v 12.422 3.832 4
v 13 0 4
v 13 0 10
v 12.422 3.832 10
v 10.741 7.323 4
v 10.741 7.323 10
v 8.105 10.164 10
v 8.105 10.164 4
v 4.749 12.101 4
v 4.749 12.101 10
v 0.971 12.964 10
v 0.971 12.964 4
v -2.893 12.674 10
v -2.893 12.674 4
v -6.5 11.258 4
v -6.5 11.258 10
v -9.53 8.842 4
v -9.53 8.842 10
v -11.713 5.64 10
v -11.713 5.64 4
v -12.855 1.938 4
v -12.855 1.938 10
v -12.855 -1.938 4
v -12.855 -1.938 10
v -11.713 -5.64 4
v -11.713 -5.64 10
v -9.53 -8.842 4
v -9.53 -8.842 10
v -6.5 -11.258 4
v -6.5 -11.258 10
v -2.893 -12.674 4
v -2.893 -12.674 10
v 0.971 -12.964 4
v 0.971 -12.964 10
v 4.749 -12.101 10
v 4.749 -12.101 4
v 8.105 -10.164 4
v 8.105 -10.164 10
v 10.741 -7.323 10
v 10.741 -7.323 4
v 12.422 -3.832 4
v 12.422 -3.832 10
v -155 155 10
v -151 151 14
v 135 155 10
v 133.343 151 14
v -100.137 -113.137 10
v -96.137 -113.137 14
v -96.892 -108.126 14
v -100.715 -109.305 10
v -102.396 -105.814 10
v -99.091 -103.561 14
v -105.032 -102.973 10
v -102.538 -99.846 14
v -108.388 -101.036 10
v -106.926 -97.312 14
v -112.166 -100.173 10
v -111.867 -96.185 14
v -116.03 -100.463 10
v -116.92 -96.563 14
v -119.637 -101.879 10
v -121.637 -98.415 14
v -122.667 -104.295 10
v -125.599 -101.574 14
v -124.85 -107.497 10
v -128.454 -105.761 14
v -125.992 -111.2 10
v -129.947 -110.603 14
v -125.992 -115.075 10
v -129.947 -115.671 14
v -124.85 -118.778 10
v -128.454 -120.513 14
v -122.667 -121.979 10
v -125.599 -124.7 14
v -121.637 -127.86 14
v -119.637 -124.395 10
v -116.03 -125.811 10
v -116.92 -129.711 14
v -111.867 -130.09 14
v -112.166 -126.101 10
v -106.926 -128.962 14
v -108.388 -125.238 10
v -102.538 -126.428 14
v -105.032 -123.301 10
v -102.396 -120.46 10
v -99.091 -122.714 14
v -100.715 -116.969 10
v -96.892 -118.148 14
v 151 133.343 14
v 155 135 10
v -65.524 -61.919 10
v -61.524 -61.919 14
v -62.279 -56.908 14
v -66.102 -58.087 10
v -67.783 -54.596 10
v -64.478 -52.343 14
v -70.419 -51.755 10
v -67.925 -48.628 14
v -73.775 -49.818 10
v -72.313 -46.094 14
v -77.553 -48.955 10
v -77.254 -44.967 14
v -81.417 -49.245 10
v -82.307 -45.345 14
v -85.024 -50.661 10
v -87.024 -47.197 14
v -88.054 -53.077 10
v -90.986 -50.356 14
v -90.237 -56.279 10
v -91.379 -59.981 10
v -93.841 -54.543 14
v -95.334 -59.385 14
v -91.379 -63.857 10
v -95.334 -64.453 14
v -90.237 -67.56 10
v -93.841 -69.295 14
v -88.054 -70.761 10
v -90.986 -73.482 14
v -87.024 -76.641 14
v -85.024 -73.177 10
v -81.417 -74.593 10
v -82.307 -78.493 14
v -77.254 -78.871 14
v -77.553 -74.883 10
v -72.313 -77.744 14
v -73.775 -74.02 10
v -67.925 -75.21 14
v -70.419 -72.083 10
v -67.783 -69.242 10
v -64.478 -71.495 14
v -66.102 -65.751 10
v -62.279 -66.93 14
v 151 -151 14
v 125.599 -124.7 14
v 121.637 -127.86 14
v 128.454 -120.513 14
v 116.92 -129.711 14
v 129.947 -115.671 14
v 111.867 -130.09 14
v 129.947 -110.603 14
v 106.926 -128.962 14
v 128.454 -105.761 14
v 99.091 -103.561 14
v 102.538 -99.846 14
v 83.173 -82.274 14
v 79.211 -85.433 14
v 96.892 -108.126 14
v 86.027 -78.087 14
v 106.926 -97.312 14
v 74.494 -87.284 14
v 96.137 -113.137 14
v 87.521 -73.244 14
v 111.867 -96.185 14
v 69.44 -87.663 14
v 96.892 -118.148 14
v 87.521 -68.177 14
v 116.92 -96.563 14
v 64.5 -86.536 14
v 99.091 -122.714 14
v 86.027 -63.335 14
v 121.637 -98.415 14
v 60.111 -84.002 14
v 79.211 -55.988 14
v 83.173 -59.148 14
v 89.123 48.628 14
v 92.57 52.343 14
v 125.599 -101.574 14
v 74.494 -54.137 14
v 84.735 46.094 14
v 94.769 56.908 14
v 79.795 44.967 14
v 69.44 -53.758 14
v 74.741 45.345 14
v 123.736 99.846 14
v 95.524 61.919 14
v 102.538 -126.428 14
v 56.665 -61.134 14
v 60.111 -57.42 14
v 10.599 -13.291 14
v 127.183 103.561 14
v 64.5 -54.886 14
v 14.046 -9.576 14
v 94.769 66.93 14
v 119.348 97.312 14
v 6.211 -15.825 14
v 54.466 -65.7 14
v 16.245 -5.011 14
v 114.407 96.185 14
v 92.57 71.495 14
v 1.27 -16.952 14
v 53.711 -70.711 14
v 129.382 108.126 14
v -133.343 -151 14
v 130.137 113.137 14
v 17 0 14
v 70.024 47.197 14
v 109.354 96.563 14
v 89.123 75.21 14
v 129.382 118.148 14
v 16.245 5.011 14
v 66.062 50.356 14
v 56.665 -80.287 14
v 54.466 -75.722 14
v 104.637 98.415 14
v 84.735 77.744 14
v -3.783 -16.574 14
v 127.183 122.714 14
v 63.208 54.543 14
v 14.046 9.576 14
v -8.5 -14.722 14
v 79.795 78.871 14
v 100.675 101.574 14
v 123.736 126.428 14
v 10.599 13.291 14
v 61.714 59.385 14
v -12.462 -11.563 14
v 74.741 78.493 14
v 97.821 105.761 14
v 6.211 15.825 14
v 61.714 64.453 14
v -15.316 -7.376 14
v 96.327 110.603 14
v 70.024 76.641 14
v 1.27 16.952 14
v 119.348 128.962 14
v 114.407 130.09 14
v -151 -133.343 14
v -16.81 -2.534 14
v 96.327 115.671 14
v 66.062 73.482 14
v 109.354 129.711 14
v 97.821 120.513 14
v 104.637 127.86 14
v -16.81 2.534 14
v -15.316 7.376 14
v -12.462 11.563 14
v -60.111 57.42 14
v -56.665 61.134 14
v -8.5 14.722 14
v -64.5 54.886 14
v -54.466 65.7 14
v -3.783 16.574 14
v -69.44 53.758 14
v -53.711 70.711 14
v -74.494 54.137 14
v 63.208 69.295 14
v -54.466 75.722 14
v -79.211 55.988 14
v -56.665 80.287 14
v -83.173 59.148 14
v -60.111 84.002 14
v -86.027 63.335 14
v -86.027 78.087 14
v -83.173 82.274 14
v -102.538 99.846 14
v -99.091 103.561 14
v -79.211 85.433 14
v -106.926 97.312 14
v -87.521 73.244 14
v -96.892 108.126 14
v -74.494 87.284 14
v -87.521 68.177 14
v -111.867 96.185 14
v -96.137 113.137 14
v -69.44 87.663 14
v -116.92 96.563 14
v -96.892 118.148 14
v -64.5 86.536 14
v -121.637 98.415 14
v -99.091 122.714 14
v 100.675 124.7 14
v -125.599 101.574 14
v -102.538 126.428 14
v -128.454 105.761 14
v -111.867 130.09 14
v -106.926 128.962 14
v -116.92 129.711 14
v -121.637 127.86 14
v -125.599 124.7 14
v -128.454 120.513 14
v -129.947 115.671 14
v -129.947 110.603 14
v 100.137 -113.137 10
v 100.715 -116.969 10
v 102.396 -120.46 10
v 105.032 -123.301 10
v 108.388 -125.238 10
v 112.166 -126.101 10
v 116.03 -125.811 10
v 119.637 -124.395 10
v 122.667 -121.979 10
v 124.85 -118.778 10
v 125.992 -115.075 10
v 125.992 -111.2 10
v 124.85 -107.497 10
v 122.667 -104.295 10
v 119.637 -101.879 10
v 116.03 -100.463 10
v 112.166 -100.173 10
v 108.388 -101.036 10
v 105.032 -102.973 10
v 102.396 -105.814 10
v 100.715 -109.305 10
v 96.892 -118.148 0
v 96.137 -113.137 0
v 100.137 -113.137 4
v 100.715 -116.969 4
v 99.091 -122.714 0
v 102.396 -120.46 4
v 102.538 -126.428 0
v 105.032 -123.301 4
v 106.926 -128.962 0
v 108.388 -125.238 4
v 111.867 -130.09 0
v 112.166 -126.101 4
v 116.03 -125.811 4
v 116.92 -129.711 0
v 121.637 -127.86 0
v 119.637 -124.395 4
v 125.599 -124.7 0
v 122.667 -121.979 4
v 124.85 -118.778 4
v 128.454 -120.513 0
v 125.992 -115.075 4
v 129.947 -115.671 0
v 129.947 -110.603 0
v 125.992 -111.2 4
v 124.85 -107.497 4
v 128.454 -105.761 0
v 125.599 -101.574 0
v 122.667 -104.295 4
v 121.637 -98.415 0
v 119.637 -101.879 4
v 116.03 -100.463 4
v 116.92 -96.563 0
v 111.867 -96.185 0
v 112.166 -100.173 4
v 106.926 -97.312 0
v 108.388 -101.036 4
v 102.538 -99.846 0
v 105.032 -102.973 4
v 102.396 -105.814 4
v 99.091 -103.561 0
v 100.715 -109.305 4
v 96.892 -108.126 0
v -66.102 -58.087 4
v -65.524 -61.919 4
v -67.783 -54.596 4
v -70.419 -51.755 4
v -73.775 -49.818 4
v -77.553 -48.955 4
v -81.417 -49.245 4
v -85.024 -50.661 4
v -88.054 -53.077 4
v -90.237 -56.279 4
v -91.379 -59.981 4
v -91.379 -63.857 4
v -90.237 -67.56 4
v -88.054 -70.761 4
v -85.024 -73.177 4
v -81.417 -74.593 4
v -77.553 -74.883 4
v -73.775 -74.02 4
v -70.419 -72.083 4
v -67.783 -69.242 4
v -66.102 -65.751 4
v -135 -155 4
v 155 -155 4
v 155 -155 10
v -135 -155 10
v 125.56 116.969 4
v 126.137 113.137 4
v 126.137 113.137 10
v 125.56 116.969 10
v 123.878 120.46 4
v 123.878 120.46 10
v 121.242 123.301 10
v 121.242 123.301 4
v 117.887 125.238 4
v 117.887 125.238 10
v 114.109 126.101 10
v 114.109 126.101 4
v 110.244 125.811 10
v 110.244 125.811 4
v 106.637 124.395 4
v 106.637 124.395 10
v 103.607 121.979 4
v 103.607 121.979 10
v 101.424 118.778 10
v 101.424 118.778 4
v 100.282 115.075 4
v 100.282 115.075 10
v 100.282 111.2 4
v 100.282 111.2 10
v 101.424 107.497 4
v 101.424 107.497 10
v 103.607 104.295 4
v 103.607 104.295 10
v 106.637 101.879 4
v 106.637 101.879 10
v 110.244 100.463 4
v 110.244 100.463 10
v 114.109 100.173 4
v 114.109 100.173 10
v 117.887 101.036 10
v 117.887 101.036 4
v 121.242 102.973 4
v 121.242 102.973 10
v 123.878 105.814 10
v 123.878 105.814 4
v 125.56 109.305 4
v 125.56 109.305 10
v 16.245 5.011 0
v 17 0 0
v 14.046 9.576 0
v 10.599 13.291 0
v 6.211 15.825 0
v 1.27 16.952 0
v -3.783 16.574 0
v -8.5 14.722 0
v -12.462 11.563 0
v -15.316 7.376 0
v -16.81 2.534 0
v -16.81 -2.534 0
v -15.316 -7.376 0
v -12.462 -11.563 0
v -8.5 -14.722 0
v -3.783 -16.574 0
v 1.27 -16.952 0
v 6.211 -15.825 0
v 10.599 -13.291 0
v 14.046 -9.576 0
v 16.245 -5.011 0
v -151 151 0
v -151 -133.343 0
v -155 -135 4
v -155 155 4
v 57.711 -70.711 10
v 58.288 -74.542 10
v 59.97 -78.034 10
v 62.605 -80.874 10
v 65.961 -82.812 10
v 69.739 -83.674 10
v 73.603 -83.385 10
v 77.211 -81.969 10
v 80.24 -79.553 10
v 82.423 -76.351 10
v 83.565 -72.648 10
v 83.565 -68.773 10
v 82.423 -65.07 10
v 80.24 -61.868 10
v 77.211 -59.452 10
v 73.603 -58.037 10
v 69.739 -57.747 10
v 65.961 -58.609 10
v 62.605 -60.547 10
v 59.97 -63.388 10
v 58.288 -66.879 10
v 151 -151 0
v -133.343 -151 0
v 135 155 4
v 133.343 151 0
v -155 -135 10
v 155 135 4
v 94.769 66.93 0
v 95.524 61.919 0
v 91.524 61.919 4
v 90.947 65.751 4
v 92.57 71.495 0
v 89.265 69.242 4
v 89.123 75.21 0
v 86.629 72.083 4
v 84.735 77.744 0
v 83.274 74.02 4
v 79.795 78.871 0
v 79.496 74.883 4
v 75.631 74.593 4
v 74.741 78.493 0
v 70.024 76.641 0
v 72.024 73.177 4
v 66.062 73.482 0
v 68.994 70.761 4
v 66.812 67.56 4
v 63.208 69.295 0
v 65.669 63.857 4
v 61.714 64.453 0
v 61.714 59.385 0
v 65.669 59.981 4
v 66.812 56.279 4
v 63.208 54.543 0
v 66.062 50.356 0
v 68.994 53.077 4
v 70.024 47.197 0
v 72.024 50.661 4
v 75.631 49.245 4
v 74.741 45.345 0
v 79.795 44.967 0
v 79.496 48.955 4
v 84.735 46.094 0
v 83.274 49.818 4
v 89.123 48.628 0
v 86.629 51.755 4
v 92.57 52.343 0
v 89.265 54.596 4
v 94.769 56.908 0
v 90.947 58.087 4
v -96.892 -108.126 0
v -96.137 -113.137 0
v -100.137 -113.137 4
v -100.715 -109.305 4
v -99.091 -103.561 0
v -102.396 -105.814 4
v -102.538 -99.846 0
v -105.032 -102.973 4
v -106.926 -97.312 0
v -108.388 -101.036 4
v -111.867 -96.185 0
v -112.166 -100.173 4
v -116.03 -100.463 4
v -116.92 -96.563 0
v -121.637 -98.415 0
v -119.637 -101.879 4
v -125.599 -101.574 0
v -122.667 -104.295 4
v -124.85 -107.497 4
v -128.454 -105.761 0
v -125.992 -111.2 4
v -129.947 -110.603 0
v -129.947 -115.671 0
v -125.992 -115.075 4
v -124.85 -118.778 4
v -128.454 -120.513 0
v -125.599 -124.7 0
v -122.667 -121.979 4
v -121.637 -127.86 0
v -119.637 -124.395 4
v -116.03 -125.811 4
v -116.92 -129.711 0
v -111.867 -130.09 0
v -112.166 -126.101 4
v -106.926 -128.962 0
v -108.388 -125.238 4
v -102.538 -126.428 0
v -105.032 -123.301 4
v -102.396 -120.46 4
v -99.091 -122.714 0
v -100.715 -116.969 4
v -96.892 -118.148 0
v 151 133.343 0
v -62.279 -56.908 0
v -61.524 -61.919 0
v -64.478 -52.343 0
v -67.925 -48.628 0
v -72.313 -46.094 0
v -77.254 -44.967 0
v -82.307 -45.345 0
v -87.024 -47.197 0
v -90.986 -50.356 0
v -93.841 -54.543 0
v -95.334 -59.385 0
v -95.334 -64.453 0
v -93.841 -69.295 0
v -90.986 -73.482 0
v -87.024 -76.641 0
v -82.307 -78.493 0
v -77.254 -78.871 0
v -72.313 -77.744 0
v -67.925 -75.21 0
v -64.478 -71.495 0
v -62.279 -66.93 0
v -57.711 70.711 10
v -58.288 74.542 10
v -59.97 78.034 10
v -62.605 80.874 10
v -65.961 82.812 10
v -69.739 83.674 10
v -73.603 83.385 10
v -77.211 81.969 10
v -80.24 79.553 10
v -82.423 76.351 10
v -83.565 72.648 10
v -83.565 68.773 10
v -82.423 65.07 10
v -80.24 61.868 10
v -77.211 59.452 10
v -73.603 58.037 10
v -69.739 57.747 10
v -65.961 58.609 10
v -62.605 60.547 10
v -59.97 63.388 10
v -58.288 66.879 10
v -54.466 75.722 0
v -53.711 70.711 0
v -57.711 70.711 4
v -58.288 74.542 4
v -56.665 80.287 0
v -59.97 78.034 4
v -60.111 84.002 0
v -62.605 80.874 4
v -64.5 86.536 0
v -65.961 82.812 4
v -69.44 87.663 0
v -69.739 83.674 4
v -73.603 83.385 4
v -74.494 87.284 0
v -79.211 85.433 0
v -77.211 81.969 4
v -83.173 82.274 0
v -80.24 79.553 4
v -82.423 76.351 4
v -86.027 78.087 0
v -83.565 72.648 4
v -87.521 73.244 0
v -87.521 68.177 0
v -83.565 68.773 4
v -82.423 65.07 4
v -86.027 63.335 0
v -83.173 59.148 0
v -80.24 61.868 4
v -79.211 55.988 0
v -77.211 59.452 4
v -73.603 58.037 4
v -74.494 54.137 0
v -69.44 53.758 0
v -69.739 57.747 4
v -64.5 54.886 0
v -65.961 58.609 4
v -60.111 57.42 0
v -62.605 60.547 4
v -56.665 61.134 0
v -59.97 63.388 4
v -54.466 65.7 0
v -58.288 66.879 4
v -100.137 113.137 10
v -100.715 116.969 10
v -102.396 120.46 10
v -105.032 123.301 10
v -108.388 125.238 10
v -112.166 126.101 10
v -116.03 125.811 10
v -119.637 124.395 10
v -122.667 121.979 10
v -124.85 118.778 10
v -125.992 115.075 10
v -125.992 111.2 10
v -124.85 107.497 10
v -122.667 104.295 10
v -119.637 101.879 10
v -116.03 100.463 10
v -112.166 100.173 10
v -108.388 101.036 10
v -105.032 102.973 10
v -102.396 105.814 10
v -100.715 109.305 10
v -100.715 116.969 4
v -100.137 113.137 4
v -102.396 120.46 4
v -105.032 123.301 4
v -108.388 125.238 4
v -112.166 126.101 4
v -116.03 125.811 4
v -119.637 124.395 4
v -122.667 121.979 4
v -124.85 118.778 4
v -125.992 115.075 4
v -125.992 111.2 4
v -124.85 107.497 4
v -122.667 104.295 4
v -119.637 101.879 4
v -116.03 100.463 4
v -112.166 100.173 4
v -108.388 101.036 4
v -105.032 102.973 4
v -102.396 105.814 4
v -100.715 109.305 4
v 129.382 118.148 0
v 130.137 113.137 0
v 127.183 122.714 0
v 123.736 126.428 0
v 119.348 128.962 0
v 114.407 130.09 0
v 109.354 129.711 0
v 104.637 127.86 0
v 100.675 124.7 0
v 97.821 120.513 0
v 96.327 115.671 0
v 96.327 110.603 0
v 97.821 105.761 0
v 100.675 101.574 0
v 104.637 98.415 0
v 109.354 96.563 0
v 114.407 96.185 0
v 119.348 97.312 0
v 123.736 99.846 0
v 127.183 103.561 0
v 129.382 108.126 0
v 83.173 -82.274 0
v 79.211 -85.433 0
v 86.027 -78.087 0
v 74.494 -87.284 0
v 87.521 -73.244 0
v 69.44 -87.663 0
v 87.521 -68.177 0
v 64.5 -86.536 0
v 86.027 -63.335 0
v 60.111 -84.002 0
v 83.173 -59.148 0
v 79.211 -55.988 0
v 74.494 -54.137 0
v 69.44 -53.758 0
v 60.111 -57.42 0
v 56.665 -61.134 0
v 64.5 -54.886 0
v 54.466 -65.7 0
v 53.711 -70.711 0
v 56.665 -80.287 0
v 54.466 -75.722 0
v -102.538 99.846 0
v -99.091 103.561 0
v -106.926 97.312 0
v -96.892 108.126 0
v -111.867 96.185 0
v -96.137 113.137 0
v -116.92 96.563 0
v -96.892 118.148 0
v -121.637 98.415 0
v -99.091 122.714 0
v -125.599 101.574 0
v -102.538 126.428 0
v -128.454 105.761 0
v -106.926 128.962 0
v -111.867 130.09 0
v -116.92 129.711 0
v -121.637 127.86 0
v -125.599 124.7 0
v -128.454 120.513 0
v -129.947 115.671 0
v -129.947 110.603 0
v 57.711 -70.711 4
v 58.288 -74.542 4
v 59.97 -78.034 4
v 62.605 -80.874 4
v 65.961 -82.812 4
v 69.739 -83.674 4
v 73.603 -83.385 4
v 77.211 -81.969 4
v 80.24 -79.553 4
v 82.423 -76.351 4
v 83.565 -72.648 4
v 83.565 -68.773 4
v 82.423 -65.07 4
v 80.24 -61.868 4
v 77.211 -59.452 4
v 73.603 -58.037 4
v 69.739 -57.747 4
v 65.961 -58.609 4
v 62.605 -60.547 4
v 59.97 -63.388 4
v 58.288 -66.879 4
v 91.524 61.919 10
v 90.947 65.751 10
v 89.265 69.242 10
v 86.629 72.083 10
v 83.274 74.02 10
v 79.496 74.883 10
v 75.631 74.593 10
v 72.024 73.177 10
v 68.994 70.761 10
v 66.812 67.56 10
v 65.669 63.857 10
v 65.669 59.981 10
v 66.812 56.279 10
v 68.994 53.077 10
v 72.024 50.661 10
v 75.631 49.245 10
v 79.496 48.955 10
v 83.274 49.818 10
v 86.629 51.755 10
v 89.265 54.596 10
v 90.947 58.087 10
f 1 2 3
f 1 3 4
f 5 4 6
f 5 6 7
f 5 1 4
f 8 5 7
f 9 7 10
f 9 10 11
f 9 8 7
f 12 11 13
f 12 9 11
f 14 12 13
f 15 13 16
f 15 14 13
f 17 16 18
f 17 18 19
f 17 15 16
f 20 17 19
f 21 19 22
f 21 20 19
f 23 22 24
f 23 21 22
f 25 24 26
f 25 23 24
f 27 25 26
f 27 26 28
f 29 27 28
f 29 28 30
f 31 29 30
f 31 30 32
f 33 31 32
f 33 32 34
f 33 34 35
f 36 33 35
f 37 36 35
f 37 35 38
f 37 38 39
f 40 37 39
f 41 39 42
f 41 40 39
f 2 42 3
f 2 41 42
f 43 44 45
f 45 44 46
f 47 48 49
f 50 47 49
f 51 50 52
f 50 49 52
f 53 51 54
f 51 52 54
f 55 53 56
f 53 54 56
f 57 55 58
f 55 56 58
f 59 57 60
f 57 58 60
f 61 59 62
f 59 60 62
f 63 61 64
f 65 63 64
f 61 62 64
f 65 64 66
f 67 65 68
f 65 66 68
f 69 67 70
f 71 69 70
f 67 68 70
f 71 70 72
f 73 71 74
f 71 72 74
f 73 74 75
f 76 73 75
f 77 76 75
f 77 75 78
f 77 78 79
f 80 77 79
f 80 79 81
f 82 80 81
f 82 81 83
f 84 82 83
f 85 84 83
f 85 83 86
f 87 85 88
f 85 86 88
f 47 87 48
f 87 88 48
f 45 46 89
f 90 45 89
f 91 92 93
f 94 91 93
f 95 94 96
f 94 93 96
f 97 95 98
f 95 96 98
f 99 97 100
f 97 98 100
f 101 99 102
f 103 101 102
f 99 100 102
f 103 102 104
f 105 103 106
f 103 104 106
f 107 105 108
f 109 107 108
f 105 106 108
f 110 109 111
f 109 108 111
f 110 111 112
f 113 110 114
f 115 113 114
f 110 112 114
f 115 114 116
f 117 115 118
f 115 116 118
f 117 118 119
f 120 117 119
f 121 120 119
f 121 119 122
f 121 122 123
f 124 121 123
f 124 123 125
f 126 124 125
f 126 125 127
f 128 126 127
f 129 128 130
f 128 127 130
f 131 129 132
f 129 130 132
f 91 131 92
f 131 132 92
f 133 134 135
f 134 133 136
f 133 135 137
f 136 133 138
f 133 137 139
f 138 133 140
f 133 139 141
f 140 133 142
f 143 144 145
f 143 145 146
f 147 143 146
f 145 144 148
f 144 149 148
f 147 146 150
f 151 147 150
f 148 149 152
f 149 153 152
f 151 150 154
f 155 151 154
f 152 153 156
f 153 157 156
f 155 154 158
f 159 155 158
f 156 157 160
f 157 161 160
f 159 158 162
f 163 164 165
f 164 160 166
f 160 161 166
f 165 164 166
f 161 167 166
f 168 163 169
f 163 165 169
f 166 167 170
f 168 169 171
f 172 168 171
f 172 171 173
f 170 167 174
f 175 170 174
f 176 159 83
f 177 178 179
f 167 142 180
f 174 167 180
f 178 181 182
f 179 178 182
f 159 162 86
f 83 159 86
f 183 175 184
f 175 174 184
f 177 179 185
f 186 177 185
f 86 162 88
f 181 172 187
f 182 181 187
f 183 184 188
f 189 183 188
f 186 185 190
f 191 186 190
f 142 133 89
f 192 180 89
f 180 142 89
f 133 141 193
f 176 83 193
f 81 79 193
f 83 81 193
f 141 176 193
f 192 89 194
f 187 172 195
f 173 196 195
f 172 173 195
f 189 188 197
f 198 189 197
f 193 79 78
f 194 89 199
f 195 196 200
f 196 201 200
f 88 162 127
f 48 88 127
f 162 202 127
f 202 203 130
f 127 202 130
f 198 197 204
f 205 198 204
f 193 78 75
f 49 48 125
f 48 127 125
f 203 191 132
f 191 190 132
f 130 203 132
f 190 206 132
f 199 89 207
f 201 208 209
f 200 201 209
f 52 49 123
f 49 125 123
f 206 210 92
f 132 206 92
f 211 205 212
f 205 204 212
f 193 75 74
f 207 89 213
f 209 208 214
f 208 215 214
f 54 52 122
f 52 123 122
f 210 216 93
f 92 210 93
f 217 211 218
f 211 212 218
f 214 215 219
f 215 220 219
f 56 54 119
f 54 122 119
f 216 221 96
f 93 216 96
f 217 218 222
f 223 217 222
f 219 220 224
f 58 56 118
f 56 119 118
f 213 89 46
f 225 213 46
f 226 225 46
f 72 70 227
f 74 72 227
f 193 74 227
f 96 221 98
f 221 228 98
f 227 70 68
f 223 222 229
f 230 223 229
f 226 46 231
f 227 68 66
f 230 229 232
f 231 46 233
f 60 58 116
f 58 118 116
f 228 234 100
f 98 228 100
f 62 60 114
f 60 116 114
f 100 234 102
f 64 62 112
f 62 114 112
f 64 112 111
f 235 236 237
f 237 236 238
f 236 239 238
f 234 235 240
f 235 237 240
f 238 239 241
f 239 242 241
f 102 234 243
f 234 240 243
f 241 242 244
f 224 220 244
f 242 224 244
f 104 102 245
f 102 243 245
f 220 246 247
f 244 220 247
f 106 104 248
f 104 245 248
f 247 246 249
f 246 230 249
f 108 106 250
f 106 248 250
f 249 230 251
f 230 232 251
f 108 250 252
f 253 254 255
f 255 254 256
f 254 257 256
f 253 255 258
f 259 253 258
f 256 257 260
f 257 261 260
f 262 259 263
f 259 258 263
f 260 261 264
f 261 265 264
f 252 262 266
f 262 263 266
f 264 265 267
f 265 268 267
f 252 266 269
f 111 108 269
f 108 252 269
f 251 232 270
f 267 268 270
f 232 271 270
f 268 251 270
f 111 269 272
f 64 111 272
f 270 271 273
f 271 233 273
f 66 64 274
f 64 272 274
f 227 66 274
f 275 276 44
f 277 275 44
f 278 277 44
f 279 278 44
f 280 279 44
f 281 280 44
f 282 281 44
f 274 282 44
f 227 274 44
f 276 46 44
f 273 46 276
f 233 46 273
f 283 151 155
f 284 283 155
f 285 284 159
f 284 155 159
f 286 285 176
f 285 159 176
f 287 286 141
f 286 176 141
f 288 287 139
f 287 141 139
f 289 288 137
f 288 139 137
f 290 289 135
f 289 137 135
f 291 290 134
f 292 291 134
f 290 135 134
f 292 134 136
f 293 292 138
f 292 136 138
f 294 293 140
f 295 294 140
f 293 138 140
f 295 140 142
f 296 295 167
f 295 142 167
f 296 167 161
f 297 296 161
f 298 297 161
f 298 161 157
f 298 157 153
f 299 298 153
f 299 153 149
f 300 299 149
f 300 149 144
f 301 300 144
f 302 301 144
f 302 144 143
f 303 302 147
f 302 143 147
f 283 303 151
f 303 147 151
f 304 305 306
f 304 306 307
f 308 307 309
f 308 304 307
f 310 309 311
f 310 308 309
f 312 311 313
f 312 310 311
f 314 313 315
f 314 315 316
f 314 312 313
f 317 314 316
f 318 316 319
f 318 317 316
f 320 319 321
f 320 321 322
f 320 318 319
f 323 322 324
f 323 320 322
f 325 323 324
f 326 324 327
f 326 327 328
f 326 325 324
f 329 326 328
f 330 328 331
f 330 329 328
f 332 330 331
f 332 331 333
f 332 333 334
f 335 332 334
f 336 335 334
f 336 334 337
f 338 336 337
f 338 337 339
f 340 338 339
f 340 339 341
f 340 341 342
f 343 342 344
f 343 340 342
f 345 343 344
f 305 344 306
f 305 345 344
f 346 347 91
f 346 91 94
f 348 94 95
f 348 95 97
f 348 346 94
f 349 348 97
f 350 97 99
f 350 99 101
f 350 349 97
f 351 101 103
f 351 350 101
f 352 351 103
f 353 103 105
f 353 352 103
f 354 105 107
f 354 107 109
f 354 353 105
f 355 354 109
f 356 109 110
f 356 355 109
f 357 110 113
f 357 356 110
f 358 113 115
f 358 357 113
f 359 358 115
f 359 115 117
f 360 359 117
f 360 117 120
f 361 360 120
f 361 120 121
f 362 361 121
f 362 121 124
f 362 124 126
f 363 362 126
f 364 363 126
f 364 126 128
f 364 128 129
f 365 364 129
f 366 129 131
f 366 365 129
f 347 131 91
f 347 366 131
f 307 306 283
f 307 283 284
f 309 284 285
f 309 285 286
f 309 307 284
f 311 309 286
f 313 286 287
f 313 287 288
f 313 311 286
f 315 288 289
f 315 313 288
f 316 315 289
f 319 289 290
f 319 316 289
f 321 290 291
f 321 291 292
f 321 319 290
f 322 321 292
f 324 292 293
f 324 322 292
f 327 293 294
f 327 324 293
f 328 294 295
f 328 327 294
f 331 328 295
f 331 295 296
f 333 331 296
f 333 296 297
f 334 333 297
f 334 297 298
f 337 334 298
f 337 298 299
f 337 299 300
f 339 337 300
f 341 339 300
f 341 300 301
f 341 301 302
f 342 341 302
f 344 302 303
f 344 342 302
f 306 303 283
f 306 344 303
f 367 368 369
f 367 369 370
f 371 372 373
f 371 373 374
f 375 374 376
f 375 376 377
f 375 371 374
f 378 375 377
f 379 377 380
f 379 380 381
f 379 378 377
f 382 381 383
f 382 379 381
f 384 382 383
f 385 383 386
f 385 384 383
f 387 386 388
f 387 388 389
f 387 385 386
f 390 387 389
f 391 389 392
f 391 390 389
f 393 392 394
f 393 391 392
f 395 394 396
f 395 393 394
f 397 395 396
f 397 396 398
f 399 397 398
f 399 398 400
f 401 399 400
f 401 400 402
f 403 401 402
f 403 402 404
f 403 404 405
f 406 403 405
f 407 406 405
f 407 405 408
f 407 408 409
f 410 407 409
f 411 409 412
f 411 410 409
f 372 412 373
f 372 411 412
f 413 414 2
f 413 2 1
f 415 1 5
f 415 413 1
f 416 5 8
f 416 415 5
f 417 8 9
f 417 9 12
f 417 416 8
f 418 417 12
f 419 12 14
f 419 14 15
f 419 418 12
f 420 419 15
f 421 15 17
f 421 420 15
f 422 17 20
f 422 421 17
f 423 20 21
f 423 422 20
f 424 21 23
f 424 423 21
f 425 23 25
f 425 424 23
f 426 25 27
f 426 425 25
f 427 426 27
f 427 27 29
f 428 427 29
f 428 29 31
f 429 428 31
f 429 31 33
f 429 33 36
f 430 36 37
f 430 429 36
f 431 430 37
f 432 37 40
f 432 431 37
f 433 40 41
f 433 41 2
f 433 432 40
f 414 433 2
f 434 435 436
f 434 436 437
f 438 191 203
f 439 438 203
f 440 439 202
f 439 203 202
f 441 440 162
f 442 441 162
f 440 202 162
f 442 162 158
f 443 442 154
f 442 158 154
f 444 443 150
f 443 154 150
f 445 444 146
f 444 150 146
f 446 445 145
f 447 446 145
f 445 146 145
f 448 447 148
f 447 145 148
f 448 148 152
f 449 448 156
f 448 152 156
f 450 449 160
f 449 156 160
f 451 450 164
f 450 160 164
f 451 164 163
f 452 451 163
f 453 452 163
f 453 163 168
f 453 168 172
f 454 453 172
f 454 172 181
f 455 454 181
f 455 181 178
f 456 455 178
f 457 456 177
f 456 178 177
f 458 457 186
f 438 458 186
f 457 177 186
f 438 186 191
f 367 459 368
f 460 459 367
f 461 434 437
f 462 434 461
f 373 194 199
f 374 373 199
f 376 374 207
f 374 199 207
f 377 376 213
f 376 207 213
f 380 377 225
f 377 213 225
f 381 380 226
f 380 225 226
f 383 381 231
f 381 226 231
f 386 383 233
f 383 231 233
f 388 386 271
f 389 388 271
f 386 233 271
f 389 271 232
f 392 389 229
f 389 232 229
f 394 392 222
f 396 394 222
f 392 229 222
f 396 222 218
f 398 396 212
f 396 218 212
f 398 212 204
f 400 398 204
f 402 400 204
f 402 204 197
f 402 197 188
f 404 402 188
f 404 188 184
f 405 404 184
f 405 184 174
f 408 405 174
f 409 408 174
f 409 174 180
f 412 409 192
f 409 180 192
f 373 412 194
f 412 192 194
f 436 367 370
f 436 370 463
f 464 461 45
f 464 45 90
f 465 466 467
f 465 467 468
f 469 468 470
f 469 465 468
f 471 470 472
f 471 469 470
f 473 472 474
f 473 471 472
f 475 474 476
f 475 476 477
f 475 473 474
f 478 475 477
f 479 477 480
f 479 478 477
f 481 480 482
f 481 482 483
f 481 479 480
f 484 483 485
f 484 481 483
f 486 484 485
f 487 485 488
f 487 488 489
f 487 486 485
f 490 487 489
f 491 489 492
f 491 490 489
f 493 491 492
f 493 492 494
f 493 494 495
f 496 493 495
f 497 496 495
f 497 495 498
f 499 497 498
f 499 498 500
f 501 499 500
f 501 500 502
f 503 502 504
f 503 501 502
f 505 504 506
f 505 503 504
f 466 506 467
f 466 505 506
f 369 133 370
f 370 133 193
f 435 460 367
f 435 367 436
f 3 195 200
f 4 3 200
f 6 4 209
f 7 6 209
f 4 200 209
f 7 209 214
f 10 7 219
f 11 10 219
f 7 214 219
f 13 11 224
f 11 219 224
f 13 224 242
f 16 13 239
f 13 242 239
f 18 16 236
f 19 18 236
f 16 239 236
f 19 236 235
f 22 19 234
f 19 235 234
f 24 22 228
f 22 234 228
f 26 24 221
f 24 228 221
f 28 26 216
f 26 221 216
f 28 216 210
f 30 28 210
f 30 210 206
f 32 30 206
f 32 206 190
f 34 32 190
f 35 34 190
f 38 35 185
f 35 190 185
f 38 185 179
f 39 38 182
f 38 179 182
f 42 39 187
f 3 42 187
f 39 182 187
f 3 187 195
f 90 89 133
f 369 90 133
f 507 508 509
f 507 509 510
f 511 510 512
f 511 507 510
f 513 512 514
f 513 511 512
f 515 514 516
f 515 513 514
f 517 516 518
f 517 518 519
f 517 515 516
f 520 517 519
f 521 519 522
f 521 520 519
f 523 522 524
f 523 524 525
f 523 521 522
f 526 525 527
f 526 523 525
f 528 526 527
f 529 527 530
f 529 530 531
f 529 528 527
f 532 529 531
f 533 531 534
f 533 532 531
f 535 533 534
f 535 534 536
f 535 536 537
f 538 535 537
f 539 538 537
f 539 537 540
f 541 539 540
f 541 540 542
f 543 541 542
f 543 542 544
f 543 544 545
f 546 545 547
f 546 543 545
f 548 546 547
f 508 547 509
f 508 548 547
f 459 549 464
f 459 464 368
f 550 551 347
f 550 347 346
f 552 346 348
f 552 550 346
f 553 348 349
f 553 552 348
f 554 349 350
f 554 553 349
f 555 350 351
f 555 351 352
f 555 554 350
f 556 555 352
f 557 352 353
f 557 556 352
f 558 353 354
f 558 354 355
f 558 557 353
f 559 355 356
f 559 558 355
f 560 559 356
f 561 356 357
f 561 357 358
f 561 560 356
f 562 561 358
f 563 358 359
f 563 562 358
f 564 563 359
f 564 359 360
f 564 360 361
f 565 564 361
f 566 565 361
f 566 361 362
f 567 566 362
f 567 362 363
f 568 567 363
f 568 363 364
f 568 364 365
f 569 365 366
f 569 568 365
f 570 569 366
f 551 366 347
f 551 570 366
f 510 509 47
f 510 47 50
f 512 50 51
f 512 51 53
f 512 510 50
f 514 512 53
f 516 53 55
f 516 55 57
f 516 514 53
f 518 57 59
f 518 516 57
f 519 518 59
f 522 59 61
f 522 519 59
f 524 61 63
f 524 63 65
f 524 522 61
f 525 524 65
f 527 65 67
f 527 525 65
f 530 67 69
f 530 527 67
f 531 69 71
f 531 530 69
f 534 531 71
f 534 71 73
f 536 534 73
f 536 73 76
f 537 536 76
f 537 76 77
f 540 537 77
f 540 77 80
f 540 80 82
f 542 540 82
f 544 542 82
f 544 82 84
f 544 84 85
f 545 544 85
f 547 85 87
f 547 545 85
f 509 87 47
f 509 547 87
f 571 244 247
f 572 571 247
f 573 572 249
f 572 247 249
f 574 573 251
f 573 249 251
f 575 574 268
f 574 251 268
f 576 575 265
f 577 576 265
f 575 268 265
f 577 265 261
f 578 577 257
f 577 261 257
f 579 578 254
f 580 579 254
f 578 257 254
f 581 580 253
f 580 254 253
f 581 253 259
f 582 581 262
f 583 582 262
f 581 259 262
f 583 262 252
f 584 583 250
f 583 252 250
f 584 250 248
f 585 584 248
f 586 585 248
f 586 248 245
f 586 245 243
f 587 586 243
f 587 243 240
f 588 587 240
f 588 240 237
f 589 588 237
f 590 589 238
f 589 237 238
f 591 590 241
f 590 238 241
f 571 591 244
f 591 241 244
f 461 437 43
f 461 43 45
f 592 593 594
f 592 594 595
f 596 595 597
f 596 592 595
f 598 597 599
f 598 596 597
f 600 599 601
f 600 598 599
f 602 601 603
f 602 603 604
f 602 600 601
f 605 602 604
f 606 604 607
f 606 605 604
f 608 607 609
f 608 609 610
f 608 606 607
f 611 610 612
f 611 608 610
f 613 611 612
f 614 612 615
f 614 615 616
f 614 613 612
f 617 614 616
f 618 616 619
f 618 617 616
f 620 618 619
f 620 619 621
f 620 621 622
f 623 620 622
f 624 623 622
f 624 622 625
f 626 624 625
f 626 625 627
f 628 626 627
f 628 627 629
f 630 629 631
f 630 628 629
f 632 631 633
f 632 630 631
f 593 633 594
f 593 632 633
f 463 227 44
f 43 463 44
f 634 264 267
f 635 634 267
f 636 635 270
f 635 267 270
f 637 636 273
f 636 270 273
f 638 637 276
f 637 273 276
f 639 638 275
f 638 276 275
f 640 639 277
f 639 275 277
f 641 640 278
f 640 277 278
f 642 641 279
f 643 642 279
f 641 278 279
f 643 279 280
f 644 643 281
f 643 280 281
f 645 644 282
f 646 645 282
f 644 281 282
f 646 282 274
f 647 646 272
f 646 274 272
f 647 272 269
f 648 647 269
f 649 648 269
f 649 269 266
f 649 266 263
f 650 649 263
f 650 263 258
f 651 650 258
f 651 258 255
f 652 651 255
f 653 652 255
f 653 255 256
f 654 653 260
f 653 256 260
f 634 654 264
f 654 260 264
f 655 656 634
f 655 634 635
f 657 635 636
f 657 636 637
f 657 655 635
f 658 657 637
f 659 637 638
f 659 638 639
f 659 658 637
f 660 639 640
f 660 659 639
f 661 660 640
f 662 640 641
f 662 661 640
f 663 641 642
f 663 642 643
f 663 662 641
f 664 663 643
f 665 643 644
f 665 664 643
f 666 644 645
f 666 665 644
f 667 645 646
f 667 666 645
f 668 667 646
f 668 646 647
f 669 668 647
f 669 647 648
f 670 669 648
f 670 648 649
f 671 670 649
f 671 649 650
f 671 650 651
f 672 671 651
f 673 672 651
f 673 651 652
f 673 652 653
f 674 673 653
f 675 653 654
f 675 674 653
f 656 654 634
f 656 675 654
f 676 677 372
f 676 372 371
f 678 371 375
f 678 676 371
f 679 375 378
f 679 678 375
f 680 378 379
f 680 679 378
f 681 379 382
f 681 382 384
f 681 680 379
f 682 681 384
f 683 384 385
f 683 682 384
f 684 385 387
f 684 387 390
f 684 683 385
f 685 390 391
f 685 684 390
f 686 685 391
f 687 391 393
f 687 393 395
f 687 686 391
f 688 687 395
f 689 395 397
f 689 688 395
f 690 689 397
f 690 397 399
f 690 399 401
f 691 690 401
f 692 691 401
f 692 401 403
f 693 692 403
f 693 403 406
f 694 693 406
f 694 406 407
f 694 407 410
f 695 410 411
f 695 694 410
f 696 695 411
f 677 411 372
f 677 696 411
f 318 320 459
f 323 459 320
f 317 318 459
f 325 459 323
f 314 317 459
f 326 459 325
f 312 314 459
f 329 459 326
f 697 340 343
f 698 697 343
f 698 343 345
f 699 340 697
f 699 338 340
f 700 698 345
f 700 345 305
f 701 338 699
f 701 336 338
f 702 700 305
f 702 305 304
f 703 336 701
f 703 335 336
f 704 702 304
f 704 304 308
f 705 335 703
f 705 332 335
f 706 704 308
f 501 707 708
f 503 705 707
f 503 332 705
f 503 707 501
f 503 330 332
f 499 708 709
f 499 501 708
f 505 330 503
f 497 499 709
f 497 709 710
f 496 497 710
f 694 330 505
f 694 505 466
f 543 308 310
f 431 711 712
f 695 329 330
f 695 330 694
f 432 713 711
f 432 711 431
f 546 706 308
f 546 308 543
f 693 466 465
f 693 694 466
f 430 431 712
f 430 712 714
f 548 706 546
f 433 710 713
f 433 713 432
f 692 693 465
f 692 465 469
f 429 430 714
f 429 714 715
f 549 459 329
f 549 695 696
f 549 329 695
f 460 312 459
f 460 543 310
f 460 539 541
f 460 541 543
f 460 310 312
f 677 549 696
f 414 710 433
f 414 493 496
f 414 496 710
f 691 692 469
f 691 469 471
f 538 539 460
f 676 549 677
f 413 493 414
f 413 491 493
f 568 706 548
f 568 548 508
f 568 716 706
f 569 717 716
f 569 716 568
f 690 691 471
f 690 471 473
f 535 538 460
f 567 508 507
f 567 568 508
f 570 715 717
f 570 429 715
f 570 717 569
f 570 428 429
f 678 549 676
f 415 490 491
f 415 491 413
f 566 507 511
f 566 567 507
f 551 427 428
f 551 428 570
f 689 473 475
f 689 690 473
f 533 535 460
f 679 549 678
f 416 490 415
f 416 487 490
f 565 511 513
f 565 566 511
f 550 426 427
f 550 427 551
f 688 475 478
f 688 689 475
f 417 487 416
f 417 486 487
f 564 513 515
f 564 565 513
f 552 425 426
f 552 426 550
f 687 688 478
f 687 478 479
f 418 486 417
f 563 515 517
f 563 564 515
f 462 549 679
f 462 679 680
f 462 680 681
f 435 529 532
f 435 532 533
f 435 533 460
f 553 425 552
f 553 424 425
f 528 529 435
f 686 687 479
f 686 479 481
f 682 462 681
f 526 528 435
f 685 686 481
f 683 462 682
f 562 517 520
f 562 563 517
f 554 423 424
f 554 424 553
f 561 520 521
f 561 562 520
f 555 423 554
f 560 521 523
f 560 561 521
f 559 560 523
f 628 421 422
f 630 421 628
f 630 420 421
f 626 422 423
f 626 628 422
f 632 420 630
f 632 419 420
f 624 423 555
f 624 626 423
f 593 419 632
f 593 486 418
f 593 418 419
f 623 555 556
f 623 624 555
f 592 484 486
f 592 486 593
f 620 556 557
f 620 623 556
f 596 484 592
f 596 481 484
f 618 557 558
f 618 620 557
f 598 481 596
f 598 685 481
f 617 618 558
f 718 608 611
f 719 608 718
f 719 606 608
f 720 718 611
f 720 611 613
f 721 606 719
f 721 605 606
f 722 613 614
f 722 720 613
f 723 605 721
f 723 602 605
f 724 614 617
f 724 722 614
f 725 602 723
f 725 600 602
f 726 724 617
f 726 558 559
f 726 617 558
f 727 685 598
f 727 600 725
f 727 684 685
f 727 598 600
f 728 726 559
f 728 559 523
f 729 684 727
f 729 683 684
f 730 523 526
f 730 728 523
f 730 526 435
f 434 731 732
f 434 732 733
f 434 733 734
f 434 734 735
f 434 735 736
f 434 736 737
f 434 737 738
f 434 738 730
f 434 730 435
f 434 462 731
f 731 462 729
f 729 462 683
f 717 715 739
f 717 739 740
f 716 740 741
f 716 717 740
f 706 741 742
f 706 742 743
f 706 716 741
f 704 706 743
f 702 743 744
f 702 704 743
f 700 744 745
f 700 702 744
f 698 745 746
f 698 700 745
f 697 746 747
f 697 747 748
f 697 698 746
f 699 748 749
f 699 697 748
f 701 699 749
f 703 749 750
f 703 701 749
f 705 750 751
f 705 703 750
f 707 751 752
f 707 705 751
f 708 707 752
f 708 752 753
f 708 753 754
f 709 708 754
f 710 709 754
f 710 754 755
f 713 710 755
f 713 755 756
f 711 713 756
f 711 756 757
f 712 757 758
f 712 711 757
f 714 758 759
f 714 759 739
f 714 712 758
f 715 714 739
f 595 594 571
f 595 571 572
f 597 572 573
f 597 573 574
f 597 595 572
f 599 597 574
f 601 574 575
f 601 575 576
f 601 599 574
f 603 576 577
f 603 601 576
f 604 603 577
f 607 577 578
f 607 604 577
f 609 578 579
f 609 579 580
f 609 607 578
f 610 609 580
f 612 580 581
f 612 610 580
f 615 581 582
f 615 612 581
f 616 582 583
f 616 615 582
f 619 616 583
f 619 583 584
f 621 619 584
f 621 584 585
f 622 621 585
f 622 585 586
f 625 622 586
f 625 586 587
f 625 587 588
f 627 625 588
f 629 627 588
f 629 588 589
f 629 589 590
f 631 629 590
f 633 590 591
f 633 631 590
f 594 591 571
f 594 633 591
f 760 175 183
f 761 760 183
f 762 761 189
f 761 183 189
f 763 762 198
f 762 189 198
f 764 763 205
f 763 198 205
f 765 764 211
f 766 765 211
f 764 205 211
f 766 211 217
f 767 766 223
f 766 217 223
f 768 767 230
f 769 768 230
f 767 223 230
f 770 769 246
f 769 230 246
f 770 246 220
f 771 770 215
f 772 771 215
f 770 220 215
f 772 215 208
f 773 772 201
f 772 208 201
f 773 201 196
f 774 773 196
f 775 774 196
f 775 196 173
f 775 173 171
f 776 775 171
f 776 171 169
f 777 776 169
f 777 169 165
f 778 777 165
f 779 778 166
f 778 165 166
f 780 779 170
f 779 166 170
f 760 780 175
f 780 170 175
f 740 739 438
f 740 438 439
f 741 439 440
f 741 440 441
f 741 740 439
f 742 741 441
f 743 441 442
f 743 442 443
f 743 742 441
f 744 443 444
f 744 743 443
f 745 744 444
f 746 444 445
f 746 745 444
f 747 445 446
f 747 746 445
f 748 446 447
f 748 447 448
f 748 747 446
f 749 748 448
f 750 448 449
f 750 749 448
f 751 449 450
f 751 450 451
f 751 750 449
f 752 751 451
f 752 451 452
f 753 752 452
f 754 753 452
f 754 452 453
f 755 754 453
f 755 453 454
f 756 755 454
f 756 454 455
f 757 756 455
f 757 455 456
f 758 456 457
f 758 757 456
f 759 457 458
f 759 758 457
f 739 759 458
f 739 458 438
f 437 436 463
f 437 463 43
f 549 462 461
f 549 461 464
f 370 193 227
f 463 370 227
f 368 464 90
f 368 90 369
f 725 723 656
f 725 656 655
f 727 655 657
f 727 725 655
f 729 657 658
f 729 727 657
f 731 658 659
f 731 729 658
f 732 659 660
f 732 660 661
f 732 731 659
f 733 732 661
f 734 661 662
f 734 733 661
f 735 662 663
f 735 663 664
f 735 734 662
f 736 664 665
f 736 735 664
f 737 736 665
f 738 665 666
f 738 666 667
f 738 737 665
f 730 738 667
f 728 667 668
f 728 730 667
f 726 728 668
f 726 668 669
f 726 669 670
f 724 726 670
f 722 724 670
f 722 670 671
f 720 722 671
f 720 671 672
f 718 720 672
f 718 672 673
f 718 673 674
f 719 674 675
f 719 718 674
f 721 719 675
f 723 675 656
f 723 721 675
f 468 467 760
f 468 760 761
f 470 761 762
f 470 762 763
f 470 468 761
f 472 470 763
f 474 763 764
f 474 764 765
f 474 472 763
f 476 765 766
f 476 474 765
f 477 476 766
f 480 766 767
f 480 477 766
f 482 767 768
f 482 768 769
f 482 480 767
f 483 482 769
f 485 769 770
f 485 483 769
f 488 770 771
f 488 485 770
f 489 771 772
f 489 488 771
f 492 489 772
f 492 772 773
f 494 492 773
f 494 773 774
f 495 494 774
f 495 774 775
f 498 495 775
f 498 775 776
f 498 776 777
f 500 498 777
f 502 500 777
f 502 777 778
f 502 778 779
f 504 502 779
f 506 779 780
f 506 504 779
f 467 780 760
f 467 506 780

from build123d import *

# Parameters (mm, degrees)
SKETCH_1_R         = 13
EXTRUDE_1138_DEPTH = 14
CHAMFER_1_SIZE     = 4


with BuildPart() as part:
    # 草图1 → Extrude 1138 (new body)
    with BuildSketch(Plane.XY):
        Polygon((135, 155), (155, 135), (155, -155), (-135, -155), (-155, -135), (-155, 155), align=None)
        with Locations((-113.13708499, -113.13708499)):
            Circle(SKETCH_1_R, mode=Mode.SUBTRACT)
        with Locations((-78.524110604, -61.919012055)):
            Circle(SKETCH_1_R, mode=Mode.SUBTRACT)
        with Locations((78.524110604, 61.919012055)):
            Circle(SKETCH_1_R, mode=Mode.SUBTRACT)
        with Locations((113.13708499, 113.13708499)):
            Circle(SKETCH_1_R, mode=Mode.SUBTRACT)
        with Locations((-70.710678119, 70.710678119)):
            Circle(SKETCH_1_R, mode=Mode.SUBTRACT)
        with Locations((-113.13708499, 113.13708499)):
            Circle(SKETCH_1_R, mode=Mode.SUBTRACT)
        with Locations(Location((70.710678119, -70.710678119, 0), (0, 0, 180))):
            Circle(SKETCH_1_R, mode=Mode.SUBTRACT)
        with Locations(Location((113.13708499, -113.13708499, 0), (0, 0, 180))):
            Circle(SKETCH_1_R, mode=Mode.SUBTRACT)
        Circle(SKETCH_1_R, mode=Mode.SUBTRACT)
    extrude(amount=EXTRUDE_1138_DEPTH)

    # 倒角1
    chamfer_1_edges = [part.edges().sort_by_distance(p)[0] for p in [
        (10, -155, 14),
        (155, -10, 14),
        (145, 145, 14),
        (-126.13708499, -113.13708499, 0),
        (-126.13708499, -113.13708499, 14),
        (-10, 155, 14),
        (-91.524110604, -61.919012055, 0),
        (-91.524110604, -61.919012055, 14),
        (65.524110604, 61.919012055, 0),
        (65.524110604, 61.919012055, 14),
        (100.13708499, 113.13708499, 0),
        (100.13708499, 113.13708499, 14),
        (-83.710678119, 70.710678119, 0),
        (-83.710678119, 70.710678119, 14),
        (-126.13708499, 113.13708499, 0),
        (-126.13708499, 113.13708499, 14),
        (83.710678119, -70.710678119, 0),
        (83.710678119, -70.710678119, 14),
        (-155, 10, 14),
        (-13, 0, 0),
        (-13, 0, 14),
        (126.13708499, -113.13708499, 0),
        (126.13708499, -113.13708499, 14),
        (-10, 155, 0),
        (145, 145, 0),
        (155, -10, 0),
        (-145, -145, 14),
        (10, -155, 0),
        (-145, -145, 0),
        (-155, 10, 0),
    ]]
    chamfer(chamfer_1_edges, length=CHAMFER_1_SIZE)


solid = part.part
